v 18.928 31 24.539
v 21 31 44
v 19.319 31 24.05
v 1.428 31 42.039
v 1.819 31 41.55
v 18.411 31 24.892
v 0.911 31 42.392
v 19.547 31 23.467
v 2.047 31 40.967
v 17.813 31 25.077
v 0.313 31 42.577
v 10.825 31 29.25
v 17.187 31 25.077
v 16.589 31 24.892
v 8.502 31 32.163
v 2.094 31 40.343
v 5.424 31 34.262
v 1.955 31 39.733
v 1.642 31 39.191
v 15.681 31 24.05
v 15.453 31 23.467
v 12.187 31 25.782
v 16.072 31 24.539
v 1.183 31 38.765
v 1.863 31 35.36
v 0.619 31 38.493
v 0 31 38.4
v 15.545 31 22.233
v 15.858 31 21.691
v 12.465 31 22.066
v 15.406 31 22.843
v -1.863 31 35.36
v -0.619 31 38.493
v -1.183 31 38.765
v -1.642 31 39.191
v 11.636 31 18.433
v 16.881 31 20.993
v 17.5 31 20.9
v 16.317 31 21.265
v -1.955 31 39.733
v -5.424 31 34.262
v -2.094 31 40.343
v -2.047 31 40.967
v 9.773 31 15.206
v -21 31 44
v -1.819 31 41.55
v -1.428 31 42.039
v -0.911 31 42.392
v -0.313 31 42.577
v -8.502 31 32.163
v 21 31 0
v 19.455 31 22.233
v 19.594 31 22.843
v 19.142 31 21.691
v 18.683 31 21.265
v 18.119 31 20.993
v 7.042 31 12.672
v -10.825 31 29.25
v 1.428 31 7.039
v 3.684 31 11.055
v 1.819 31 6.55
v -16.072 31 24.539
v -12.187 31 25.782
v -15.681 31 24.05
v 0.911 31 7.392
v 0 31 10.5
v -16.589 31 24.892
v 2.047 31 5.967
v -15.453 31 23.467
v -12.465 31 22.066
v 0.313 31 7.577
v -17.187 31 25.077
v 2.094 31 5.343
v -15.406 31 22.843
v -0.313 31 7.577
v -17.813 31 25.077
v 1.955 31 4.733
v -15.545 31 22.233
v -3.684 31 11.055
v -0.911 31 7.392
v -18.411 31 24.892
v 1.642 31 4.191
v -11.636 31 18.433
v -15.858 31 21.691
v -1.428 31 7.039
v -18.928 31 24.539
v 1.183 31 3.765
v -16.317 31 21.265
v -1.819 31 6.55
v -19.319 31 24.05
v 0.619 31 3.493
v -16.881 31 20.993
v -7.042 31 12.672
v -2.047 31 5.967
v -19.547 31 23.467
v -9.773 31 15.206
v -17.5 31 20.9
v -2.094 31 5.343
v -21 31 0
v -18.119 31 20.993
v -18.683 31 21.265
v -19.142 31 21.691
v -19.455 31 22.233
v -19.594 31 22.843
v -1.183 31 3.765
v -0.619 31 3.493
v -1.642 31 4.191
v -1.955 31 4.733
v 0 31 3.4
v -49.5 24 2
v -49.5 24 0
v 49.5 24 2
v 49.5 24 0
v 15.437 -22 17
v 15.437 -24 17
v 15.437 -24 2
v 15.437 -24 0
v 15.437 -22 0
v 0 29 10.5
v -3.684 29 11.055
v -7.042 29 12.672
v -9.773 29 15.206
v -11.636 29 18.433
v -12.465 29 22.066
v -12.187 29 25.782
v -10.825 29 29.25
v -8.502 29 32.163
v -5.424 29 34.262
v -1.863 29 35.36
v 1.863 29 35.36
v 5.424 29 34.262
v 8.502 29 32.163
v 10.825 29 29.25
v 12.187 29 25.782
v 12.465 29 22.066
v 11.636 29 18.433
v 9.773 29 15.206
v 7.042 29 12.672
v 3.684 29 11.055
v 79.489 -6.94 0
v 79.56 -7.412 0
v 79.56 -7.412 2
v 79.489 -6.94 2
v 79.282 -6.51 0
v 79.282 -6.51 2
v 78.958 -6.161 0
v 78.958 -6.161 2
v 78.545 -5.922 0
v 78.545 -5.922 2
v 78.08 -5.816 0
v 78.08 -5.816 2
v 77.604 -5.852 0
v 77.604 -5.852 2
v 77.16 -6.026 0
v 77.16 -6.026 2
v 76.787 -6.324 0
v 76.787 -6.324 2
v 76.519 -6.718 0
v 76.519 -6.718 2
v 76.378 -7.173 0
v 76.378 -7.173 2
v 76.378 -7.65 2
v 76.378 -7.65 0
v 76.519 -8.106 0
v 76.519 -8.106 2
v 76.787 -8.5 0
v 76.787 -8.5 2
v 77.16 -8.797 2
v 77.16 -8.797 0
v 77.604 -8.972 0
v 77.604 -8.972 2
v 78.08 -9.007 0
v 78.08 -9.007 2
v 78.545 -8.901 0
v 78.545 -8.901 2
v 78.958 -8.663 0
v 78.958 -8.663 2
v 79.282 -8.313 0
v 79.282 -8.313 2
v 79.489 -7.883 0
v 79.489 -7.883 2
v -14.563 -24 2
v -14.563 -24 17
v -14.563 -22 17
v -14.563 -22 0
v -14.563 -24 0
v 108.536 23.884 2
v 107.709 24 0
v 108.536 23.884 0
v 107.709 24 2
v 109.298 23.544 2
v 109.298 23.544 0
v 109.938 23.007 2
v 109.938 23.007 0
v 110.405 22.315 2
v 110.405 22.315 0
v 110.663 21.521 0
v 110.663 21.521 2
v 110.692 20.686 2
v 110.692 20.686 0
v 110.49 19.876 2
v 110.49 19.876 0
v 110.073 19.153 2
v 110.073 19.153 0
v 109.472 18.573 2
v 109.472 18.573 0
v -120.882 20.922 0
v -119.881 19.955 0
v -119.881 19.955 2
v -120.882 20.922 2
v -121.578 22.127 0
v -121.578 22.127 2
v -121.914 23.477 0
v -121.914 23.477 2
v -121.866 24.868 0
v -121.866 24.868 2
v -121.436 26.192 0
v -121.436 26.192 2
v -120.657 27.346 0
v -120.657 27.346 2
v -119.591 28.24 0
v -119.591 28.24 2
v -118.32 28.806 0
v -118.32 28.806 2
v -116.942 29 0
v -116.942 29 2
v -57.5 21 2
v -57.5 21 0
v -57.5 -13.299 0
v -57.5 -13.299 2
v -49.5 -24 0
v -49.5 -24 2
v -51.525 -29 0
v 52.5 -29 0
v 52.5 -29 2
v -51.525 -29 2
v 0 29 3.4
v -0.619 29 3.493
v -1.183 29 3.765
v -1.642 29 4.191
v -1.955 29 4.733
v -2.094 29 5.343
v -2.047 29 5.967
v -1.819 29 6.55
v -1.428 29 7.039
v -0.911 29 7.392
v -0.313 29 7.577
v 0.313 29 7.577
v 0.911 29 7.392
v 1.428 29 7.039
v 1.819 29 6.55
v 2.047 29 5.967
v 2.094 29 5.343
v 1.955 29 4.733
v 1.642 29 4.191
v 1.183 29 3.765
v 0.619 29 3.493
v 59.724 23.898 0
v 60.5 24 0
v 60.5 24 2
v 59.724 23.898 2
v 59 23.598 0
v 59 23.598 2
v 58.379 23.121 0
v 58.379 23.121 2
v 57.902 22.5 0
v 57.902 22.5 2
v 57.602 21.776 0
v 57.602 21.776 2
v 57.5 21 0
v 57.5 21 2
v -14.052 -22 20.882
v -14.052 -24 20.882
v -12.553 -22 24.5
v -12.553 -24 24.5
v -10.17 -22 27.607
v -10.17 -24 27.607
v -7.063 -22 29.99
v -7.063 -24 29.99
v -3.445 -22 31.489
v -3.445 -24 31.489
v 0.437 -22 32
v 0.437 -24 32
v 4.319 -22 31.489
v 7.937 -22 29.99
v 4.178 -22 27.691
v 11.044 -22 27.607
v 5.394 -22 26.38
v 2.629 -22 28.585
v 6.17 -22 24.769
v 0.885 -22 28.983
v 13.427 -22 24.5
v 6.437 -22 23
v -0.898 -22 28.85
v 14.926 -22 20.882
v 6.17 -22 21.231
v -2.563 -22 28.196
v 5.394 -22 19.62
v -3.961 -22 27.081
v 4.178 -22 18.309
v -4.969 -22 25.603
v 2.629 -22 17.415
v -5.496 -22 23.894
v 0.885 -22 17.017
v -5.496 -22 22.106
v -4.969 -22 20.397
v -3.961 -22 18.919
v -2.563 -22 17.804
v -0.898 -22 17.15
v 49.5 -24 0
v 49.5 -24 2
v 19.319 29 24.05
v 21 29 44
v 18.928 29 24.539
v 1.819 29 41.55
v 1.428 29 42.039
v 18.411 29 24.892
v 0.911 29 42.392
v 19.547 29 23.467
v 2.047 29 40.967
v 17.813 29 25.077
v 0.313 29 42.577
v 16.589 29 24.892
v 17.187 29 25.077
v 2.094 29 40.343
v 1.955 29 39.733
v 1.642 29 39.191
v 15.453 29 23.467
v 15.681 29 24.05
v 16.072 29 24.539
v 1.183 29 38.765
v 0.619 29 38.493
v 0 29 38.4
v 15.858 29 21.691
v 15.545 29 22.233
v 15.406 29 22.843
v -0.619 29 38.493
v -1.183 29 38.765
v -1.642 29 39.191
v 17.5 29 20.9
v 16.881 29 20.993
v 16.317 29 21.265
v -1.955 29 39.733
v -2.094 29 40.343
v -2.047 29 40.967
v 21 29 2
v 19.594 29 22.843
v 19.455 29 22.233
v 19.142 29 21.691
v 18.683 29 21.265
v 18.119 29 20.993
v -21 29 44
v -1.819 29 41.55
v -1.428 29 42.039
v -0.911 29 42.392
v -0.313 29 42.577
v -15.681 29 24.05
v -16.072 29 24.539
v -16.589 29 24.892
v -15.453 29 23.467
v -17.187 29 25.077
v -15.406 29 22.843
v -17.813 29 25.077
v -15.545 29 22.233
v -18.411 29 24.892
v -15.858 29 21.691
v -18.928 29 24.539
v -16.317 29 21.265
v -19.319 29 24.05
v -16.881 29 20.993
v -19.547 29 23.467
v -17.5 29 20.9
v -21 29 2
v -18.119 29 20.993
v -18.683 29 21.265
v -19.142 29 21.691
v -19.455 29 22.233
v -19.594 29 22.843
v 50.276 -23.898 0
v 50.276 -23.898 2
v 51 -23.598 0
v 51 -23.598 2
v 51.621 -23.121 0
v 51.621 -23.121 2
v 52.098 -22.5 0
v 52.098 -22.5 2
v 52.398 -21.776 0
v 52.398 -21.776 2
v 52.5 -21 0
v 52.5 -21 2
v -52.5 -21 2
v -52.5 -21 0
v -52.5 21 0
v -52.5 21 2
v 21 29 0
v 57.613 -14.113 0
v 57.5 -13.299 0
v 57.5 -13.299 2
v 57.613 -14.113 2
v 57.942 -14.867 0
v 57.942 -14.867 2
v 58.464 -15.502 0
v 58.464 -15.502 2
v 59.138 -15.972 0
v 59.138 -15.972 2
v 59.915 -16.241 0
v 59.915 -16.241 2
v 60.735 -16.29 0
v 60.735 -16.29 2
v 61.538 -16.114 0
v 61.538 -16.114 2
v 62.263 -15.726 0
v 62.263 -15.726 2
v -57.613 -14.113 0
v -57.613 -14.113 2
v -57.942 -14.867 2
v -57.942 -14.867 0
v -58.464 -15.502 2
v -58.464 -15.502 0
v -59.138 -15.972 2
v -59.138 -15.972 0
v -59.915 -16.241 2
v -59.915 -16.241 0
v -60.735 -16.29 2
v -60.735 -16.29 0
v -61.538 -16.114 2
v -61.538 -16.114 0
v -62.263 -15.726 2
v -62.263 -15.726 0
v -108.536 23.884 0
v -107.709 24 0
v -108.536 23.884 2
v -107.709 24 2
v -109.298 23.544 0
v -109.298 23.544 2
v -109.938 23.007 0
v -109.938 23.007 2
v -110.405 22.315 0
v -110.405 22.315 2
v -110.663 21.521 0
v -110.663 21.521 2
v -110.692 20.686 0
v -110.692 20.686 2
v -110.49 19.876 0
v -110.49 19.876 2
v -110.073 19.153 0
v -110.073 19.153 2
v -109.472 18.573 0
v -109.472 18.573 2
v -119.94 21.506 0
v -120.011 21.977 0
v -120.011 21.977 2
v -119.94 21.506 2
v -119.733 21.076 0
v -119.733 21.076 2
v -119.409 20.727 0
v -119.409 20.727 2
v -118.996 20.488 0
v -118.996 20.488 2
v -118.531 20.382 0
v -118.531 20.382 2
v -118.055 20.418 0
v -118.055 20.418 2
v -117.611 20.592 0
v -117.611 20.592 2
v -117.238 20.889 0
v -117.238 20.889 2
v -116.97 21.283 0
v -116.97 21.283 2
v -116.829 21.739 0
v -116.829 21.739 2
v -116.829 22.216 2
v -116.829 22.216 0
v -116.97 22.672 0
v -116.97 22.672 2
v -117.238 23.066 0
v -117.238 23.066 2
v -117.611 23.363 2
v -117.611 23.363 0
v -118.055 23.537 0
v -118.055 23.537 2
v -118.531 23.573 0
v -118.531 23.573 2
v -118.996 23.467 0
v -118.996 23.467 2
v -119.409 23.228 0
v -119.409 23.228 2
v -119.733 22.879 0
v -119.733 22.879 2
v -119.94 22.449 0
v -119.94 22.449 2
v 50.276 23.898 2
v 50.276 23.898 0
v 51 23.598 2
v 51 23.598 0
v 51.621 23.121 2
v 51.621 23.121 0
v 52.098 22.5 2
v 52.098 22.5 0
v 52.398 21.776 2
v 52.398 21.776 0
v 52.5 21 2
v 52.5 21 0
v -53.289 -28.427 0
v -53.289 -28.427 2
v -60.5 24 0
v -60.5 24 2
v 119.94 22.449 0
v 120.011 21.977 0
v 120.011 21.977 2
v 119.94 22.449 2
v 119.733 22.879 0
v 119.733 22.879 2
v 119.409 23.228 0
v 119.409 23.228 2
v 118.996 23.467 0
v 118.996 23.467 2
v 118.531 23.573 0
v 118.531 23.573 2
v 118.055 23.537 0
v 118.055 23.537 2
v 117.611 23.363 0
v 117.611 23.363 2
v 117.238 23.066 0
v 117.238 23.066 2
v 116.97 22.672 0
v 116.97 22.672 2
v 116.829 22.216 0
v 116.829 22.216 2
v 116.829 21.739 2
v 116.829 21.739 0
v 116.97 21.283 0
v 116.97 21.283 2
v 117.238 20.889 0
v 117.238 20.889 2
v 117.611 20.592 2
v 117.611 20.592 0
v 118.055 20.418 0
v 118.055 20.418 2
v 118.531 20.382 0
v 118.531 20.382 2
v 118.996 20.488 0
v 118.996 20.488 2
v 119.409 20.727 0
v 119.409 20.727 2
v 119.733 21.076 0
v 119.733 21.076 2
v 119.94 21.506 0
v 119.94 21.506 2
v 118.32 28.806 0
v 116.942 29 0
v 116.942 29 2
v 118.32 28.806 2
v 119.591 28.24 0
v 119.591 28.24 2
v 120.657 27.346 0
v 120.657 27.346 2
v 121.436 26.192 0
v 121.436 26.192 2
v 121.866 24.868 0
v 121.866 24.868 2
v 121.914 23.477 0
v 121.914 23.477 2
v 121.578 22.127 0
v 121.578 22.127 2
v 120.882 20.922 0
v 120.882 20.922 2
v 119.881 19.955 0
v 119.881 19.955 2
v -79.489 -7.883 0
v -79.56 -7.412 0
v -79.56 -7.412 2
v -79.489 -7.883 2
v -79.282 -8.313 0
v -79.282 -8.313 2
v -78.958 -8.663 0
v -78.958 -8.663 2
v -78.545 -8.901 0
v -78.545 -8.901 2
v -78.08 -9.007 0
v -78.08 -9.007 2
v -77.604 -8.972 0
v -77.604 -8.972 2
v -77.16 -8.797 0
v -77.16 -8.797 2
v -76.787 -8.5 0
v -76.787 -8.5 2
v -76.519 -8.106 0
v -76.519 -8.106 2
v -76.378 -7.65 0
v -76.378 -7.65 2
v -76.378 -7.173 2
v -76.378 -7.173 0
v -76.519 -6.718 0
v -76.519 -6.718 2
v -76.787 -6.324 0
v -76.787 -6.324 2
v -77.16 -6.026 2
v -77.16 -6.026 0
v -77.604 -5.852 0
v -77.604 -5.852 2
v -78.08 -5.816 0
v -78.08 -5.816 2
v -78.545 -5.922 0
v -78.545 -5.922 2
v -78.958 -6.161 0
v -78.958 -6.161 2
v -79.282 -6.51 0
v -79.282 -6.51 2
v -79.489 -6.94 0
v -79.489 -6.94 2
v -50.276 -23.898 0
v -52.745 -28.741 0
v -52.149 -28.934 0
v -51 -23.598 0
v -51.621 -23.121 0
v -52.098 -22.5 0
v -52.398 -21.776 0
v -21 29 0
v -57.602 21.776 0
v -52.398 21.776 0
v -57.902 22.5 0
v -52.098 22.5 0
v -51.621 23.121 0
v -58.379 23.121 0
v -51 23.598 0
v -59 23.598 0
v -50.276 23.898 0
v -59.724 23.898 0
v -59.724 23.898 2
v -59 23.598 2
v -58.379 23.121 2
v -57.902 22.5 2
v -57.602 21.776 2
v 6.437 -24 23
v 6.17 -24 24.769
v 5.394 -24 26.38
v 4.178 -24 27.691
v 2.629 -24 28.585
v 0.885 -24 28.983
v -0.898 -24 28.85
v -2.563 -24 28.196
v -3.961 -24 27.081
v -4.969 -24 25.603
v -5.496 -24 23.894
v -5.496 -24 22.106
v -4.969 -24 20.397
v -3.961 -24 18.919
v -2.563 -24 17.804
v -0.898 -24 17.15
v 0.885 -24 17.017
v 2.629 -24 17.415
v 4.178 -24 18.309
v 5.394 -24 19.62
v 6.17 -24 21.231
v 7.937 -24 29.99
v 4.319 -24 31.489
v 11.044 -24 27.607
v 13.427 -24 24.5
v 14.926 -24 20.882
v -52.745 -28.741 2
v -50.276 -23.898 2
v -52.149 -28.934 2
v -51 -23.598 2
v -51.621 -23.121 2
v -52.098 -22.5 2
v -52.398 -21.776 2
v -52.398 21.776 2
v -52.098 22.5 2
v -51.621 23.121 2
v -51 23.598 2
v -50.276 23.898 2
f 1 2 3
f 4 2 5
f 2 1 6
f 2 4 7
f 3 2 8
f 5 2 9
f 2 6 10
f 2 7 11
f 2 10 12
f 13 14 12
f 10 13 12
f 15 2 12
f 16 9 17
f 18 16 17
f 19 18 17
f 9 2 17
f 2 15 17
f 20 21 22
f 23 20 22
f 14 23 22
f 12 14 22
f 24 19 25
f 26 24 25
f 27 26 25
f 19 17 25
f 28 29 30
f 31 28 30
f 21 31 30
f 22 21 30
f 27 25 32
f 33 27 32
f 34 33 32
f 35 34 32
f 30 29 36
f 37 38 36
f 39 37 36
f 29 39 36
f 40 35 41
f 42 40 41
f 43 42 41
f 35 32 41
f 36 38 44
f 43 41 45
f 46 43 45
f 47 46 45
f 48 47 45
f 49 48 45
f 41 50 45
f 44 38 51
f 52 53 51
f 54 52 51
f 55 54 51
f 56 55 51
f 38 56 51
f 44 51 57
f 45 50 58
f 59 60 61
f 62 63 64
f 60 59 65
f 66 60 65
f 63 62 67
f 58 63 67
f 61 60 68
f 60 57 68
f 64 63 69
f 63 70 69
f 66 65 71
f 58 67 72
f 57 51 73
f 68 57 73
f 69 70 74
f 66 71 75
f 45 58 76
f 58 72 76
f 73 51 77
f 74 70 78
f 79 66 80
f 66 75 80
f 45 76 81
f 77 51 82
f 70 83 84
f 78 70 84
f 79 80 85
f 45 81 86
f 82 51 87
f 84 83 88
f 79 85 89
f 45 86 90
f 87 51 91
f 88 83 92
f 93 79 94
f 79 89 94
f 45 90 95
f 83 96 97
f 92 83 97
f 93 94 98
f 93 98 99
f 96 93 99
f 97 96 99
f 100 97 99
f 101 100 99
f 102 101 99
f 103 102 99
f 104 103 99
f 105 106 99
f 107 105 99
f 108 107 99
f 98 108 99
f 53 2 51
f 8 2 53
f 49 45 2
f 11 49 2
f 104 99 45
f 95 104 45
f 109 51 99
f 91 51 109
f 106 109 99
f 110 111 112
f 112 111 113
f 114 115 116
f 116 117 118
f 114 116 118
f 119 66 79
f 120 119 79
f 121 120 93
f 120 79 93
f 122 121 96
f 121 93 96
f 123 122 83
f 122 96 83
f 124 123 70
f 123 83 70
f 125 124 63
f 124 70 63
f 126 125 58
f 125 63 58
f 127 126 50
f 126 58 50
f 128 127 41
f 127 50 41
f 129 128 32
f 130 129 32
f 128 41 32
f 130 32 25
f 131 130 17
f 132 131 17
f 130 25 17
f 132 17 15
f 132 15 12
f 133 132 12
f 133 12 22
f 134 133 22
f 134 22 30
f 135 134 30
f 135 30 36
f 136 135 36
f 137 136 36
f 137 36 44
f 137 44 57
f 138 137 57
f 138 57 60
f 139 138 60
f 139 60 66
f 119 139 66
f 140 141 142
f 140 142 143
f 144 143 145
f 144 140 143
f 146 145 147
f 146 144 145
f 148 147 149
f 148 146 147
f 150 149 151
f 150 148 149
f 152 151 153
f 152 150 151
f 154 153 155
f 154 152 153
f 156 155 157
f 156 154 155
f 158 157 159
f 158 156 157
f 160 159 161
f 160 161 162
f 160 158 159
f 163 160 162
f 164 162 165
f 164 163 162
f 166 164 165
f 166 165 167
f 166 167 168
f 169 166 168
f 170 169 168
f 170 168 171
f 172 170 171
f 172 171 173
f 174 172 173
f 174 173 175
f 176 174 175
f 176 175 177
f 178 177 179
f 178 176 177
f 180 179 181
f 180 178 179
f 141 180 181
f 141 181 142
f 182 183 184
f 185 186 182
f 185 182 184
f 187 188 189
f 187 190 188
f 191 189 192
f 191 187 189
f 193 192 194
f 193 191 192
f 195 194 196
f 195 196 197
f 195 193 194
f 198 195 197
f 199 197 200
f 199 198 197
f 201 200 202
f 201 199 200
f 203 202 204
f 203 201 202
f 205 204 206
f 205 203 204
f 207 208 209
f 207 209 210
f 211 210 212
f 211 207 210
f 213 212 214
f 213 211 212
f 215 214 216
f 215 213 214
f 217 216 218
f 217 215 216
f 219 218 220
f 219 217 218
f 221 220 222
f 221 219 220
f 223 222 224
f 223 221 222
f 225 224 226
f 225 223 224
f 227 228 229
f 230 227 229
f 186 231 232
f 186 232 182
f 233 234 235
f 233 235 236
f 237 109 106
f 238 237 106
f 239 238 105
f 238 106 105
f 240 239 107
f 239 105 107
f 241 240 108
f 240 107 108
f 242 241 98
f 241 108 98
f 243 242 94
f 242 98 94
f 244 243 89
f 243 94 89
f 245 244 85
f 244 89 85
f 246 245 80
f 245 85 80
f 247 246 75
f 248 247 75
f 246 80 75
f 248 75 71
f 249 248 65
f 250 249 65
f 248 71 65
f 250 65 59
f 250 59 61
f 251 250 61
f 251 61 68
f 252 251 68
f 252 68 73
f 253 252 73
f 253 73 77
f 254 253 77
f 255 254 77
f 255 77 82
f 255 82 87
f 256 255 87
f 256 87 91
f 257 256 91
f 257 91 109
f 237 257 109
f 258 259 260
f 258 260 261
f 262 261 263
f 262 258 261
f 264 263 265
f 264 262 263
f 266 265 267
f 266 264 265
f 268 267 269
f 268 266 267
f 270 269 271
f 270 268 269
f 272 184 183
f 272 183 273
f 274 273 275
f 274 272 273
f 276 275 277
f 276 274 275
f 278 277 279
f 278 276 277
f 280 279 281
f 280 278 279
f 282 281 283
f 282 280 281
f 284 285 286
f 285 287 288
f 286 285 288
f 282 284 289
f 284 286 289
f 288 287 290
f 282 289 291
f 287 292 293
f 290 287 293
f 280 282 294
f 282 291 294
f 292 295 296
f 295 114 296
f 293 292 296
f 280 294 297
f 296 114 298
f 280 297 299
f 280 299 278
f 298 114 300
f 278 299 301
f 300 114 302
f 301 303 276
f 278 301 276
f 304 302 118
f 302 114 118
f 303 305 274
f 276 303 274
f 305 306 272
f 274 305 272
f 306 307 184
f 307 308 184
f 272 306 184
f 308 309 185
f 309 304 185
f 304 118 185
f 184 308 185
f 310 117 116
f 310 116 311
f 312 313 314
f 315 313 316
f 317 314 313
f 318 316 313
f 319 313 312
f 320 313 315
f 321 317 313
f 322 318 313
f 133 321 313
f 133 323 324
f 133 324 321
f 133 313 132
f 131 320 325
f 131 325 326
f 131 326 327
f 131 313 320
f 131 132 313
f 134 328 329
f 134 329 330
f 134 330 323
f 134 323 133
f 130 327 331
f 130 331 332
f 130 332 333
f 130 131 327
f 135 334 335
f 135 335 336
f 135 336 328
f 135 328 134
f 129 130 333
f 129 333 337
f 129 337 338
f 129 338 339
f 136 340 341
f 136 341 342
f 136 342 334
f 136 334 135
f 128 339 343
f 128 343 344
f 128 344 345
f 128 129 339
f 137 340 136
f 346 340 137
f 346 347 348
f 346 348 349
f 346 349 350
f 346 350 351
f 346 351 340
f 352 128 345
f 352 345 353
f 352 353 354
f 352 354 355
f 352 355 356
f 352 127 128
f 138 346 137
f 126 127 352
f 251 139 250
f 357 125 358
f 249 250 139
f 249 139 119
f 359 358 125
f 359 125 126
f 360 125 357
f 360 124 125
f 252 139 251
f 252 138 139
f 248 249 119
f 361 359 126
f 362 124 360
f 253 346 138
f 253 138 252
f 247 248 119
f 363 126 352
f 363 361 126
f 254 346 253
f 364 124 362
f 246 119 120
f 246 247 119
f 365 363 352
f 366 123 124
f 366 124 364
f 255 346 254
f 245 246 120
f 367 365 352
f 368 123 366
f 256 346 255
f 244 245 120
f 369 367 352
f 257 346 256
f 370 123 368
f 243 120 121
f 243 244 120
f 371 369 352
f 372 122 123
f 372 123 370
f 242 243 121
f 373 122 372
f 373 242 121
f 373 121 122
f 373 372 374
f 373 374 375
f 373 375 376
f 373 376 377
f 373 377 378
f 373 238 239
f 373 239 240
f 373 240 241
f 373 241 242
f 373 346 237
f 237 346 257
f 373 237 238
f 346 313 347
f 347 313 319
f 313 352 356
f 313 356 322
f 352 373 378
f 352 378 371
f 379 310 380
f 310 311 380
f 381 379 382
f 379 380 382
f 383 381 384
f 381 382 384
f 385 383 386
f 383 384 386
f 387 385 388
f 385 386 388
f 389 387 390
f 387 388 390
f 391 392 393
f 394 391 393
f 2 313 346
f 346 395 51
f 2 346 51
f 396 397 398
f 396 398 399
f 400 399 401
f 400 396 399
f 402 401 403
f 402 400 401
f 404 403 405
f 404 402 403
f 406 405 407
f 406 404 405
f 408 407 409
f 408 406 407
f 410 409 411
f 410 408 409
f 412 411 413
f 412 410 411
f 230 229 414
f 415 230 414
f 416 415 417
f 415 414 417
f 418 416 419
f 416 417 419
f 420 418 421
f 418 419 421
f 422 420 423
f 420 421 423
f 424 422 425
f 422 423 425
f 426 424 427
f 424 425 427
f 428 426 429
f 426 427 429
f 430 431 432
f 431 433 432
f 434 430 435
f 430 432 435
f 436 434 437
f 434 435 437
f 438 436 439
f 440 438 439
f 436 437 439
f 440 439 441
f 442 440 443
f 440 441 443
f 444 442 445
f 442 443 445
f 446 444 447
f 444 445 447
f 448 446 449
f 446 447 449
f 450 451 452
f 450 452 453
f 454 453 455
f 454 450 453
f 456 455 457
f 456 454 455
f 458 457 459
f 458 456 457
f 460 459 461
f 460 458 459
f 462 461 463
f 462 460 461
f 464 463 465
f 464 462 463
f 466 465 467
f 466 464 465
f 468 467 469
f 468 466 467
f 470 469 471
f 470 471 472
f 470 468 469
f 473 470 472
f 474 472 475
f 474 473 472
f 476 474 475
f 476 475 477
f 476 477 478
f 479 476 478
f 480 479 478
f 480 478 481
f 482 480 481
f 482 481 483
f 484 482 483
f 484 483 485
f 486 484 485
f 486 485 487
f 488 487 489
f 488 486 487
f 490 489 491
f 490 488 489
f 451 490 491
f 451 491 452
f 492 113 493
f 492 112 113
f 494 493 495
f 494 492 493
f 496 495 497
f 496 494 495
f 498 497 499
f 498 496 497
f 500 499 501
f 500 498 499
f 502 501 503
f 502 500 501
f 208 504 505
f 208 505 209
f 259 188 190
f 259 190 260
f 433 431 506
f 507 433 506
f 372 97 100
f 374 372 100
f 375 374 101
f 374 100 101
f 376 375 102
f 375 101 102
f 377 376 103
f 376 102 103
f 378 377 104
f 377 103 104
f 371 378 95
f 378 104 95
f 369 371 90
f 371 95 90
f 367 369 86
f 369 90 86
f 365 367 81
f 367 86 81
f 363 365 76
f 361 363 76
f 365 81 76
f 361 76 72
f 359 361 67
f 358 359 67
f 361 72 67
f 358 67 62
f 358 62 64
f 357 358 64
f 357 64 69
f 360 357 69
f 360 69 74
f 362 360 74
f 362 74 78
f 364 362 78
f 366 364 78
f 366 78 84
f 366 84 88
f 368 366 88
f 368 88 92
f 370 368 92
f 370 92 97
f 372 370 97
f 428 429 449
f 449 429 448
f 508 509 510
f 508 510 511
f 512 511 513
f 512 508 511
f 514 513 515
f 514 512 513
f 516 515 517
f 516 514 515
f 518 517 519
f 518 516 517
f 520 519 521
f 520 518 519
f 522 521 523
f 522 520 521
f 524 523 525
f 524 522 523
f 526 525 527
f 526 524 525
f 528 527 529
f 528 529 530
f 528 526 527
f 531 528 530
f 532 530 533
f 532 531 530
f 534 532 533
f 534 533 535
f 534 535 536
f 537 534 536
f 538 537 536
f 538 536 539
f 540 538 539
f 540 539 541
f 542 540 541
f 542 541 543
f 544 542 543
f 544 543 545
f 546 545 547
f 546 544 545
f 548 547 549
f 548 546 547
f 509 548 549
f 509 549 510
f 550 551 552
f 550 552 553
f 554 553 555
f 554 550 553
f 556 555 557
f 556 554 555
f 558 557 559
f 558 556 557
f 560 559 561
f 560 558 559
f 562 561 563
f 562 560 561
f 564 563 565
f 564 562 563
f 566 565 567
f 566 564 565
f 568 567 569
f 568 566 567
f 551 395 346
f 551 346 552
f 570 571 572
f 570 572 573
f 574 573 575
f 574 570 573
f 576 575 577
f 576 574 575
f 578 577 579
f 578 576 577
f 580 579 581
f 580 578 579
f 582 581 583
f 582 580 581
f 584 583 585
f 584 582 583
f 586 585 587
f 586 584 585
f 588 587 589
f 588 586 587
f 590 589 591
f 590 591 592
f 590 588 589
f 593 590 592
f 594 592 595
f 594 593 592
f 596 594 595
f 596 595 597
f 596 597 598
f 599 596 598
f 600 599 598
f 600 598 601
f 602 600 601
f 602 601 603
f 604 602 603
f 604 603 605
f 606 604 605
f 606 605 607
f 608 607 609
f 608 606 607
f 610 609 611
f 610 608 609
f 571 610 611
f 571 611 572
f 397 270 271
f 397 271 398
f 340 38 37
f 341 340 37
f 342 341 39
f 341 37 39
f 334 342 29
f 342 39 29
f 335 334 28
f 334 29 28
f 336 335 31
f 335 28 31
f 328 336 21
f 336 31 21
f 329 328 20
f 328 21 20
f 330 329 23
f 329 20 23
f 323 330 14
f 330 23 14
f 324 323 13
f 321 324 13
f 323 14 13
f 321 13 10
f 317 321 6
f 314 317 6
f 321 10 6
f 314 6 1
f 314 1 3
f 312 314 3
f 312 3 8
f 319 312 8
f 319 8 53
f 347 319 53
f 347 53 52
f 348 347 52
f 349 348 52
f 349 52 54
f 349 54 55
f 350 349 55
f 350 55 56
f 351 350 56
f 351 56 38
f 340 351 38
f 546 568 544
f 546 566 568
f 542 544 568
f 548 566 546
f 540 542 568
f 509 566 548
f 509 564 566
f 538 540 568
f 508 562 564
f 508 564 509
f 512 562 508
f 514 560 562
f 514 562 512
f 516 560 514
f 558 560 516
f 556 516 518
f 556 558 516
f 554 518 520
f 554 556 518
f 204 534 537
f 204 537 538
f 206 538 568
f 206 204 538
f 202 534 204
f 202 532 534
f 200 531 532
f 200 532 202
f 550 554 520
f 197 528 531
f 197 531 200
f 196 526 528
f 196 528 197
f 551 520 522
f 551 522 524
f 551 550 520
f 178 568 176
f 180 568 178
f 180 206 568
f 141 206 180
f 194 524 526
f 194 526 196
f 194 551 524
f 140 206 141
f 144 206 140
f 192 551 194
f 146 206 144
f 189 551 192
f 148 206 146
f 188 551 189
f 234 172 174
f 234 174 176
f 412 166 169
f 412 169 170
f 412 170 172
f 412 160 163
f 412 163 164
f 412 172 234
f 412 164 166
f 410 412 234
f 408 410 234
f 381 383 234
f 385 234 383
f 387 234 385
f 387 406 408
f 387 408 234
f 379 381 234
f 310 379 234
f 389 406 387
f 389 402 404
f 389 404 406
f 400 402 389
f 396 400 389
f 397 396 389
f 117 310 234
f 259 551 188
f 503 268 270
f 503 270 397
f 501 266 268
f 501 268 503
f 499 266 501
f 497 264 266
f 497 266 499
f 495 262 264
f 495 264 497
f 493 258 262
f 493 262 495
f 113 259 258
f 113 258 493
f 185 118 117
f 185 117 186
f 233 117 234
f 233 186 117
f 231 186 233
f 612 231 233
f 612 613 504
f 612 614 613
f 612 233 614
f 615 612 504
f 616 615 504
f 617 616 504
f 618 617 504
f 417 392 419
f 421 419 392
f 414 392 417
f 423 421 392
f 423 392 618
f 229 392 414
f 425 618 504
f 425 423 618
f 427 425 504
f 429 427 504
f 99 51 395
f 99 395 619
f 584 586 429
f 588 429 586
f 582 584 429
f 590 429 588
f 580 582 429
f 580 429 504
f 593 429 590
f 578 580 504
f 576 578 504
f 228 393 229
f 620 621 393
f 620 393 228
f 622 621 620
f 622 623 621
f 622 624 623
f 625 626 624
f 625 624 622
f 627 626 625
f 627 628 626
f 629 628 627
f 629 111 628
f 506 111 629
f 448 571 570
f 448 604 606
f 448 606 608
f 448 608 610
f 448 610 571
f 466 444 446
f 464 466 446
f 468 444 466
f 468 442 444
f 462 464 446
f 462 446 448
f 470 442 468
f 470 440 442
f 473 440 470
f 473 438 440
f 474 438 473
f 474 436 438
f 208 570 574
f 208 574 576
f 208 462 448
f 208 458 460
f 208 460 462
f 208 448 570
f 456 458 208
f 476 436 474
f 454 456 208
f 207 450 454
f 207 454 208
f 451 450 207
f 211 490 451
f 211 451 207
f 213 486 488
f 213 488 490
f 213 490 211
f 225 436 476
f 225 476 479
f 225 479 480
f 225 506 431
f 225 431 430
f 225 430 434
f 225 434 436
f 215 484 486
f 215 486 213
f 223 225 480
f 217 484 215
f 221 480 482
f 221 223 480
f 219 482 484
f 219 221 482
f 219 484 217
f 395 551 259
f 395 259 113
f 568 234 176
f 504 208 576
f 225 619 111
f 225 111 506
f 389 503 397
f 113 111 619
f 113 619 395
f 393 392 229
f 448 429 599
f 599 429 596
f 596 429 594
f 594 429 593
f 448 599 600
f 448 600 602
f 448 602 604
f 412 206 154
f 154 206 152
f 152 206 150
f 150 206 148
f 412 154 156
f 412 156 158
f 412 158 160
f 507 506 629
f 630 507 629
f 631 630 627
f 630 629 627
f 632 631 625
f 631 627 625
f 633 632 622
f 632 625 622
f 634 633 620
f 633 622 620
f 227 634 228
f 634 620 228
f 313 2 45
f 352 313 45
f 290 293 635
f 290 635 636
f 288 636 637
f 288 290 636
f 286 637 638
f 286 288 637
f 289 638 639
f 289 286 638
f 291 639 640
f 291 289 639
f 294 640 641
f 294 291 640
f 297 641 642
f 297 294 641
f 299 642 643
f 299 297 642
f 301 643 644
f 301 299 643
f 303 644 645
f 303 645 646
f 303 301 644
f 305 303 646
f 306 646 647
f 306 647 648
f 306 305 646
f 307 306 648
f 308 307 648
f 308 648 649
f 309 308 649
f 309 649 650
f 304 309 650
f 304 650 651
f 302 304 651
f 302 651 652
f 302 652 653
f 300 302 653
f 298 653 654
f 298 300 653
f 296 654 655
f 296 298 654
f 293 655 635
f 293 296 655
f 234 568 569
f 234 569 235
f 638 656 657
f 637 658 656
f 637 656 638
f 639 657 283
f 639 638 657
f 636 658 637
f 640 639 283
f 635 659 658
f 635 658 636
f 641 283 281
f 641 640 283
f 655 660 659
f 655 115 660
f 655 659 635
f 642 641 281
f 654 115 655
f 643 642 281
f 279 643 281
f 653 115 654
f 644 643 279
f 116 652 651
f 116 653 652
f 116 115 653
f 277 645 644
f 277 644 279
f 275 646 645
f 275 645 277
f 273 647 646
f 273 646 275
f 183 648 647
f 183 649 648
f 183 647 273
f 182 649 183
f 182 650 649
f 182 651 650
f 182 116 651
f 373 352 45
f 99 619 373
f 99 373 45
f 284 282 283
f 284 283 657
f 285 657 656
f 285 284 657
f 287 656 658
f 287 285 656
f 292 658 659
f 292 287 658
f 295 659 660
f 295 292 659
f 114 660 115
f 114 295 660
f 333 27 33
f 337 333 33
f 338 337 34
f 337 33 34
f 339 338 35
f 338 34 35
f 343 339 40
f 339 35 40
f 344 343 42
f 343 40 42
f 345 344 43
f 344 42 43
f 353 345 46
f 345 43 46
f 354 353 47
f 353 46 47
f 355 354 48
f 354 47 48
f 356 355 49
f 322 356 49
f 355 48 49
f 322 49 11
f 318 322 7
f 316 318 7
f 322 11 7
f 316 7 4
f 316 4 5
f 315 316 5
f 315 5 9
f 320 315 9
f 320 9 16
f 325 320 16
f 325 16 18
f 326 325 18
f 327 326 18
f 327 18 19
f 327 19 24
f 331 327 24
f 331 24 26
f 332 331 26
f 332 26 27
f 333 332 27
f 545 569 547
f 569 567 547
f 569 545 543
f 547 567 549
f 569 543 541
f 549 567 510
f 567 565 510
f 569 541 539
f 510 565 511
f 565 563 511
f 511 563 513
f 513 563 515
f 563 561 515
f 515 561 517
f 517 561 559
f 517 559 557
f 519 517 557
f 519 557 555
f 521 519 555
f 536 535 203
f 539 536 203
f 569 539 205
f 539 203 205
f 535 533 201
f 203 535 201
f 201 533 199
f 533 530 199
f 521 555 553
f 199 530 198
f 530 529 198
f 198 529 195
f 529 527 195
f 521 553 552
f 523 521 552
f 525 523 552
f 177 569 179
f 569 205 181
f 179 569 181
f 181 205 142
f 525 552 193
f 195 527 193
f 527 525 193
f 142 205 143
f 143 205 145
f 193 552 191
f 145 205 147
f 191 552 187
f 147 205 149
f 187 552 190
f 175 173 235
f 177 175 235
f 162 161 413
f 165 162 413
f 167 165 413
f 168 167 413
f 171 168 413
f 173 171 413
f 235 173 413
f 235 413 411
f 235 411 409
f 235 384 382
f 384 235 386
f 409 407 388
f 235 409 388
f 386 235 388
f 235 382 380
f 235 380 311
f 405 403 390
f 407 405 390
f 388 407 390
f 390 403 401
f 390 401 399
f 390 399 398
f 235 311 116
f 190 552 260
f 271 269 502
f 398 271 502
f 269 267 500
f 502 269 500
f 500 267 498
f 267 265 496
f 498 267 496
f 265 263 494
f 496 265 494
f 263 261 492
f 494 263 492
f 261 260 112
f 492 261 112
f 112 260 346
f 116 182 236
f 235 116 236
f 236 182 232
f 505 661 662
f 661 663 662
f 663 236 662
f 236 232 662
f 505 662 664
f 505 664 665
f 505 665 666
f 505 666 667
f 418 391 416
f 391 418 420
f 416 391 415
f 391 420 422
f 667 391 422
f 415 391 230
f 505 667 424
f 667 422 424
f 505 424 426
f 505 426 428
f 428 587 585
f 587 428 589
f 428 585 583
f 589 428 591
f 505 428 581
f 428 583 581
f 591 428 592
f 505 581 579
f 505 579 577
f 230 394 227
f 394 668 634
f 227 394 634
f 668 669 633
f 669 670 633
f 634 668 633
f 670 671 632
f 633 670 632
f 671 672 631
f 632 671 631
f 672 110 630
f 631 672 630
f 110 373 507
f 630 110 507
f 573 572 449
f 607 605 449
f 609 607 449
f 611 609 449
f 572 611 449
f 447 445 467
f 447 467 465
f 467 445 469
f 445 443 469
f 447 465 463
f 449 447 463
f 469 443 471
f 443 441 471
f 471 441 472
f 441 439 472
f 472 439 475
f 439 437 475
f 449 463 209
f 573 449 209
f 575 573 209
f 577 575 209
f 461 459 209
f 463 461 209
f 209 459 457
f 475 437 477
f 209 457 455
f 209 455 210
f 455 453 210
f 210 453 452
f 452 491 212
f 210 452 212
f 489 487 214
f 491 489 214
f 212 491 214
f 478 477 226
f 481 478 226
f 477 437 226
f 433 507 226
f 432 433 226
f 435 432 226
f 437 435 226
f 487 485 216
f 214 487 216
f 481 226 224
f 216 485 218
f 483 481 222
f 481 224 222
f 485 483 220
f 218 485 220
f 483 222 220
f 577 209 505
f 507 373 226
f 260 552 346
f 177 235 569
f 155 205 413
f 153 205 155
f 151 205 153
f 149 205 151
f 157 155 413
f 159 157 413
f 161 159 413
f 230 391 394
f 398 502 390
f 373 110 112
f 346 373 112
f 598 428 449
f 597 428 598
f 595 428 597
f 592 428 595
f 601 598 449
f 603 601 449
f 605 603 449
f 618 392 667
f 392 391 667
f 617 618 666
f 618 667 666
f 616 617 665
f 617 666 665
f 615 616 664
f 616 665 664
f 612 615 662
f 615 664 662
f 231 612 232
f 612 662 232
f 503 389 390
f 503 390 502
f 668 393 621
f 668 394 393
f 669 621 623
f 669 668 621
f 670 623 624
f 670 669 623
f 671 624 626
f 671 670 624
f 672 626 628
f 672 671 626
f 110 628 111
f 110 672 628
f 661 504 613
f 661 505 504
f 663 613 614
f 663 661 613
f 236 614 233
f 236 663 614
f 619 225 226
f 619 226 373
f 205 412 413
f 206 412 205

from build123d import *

# Parameters (mm, degrees)
SKETCH_1_R                      = 1.6
SKETCH_1_W                      = 105
SKETCH_1_H                      = 48
EXTRUDE_1_DEPTH                 = 2
FILLET_1_R                      = 3
SKETCH_2_W                      = 30
SKETCH_2_H                      = 2
EXTRUDE_2_DEPTH                 = 32
CUT_EXTRUDE_START               = -2
CUT_EXTRUDE_1_OUTLINE_R         = 6
CUT_EXTRUDE_1_DEPTH             = 2
SKETCH_4_W                      = 42
SKETCH_4_H                      = 2
EXTRUDE_3_DEPTH                 = 44
CUT_EXTRUDE_2_REACH             = 144.849
SKETCH_5_R                      = 2.1
SKETCH_5_R_2                    = 12.5
CUT_EXTRUDE_2_DIRECTION_2_DEPTH = 143.84882365


# Read off the part's stored shape, not the designer's step: ｶｯﾄ - 押し出し1
with BuildPart() as part:
    # ｽｹｯﾁ1 → ﾎﾞｽ - 押し出し1 (new body)
    with BuildSketch(Plane.XY):
        with BuildLine():
            Line((-116.941733701, 29), (116.941733701, 29))
            ThreePointArc((116.941733701, 29), (121.697016283, 25.545084972), (119.880659963, 19.954915028))
            Line((119.880659963, 19.954915028), (52.5, -29))
            Line((52.5, -29), (-52.5, -29))
            Line((-52.5, -29), (-119.880659963, 19.954915028))
            ThreePointArc((-119.880659963, 19.954915028), (-121.697016283, 25.545084972), (-116.941733701, 29))
        make_face()
        with Locations((118.411196832, 21.977457514)):
            Circle(SKETCH_1_R, mode=Mode.SUBTRACT)
        with Locations((77.960347113, -7.411805101)):
            Circle(SKETCH_1_R, mode=Mode.SUBTRACT)
        with Locations(Location((-118.411196832, 21.977457514, 0), (0, 0, 180))):
            Circle(SKETCH_1_R, mode=Mode.SUBTRACT)
        with Locations(Location((-77.960347113, -7.411805101, 0), (0, 0, 180))):
            Circle(SKETCH_1_R, mode=Mode.SUBTRACT)
        Rectangle(SKETCH_1_W, SKETCH_1_H, mode=Mode.SUBTRACT)
        with BuildLine():
            Line((-57.5, 21), (-57.5, -13.299115956))
            ThreePointArc((-57.5, -13.299115956), (-59.138028501, -15.972135529), (-62.263355757, -15.726166939))
            Line((-62.263355757, -15.726166939), (-116.941733701, 24))
            Line((-116.941733701, 24), (-60.5, 24))
            ThreePointArc((-60.5, 24), (-58.378679656, 23.121320344), (-57.5, 21))
        make_face(mode=Mode.SUBTRACT)
        with BuildLine():
            Line((62.263355757, -15.726166939), (116.941733701, 24))
            Line((116.941733701, 24), (60.5, 24))
            ThreePointArc((60.5, 24), (58.378679656, 23.121320344), (57.5, 21))
            Line((57.5, 21), (57.5, -13.299115956))
            ThreePointArc((57.5, -13.299115956), (59.138028501, -15.972135529), (62.263355757, -15.726166939))
        make_face(mode=Mode.SUBTRACT)
    extrude(amount=EXTRUDE_1_DEPTH)

    # ﾌｨﾚｯﾄ1
    fillet_1_edges = [part.edges().sort_by_distance(p)[0] for p in [
        (-52.5, -29, 1),
        (-52.5, 24, 1),
        (-52.5, -24, 1),
        (52.5, -24, 1),
        (52.5, 24, 1),
        (116.941733701, 24, 1),
        (-116.941733701, 24, 1),
    ]]
    fillet(fillet_1_edges, radius=FILLET_1_R)

    # ｽｹｯﾁ2 → ﾎﾞｽ - 押し出し2 (add)
    with BuildSketch(Plane(origin=(0, 0, 0), x_dir=(-1, 0, 0), z_dir=(0, 0, -1))):
        with Locations((-0.436960971, -23)):
            Rectangle(SKETCH_2_W, SKETCH_2_H)
    extrude(amount=-EXTRUDE_2_DEPTH)

    # ｶｯﾄ - 押し出し1 outline → ｶｯﾄ - 押し出し1 (cut)
    with BuildSketch(Plane.XZ.offset(24).offset(CUT_EXTRUDE_START)):
        with BuildLine():
            ThreePointArc((-14.563039029, 17), (-10.169640747, 27.606601718), (0.436960971, 32))
            Line((0.436960971, 32), (-14.563039029, 32))
            Line((-14.563039029, 32), (-14.563039029, 17))
        make_face()
        with BuildLine():
            ThreePointArc((0.436960971, 32), (11.043562689, 27.606601718), (15.436960971, 17))
            Line((15.436960971, 17), (15.436960971, 32))
            Line((15.436960971, 32), (0.436960971, 32))
        make_face()
        with Locations((0.436960971, 23)):
            Circle(CUT_EXTRUDE_1_OUTLINE_R)
    extrude(amount=CUT_EXTRUDE_1_DEPTH, mode=Mode.SUBTRACT)

    # ｽｹｯﾁ4 → ﾎﾞｽ - 押し出し3 (add)
    with BuildSketch(Plane(origin=(0, 0, 0), x_dir=(-1, 0, 0), z_dir=(0, 0, -1))):
        with Locations((0, 30)):
            Rectangle(SKETCH_4_W, SKETCH_4_H)
    extrude(amount=-EXTRUDE_3_DEPTH)

    # ｽｹｯﾁ5 → ｶｯﾄ - 押し出し2 (cut, up to next)
    with BuildSketch(Plane(origin=(0, 31, 0), x_dir=(1, 0, 0), z_dir=(0, 1, 0)), mode=Mode.PRIVATE) as cut_extrude_2_sk1:
        with Locations(Location((0, -5.5, 0), (0, 0, 90))):
            Circle(SKETCH_5_R)
    cut_extrude_2_tool1 = extrude(cut_extrude_2_sk1.sketch, amount=-CUT_EXTRUDE_2_REACH, mode=Mode.PRIVATE) & part.part
    # ｽｹｯﾁ5 → ｶｯﾄ - 押し出し2 (cut, up to next)
    with BuildSketch(Plane(origin=(0, 31, 0), x_dir=(1, 0, 0), z_dir=(0, 1, 0)), mode=Mode.PRIVATE) as cut_extrude_2_sk2:
        with Locations(Location((-17.5, -23, 0), (0, 0, 90))):
            Circle(SKETCH_5_R)
    cut_extrude_2_tool2 = extrude(cut_extrude_2_sk2.sketch, amount=-CUT_EXTRUDE_2_REACH, mode=Mode.PRIVATE) & part.part
    # ｽｹｯﾁ5 → ｶｯﾄ - 押し出し2 (cut, up to next)
    with BuildSketch(Plane(origin=(0, 31, 0), x_dir=(1, 0, 0), z_dir=(0, 1, 0)), mode=Mode.PRIVATE) as cut_extrude_2_sk3:
        with Locations(Location((0, -40.5, 0), (0, 0, 90))):
            Circle(SKETCH_5_R)
    cut_extrude_2_tool3 = extrude(cut_extrude_2_sk3.sketch, amount=-CUT_EXTRUDE_2_REACH, mode=Mode.PRIVATE) & part.part
    # ｽｹｯﾁ5 → ｶｯﾄ - 押し出し2 (cut, up to next)
    with BuildSketch(Plane(origin=(0, 31, 0), x_dir=(1, 0, 0), z_dir=(0, 1, 0)), mode=Mode.PRIVATE) as cut_extrude_2_sk4:
        with Locations(Location((17.5, -23, 0), (0, 0, 90))):
            Circle(SKETCH_5_R)
    cut_extrude_2_tool4 = extrude(cut_extrude_2_sk4.sketch, amount=-CUT_EXTRUDE_2_REACH, mode=Mode.PRIVATE) & part.part
    # ｽｹｯﾁ5 → ｶｯﾄ - 押し出し2 (cut, up to next)
    with BuildSketch(Plane(origin=(0, 31, 0), x_dir=(1, 0, 0), z_dir=(0, 1, 0)), mode=Mode.PRIVATE) as cut_extrude_2_sk5:
        with Locations(Location((0, -23, 0), (0, 0, 90))):
            Circle(SKETCH_5_R_2)
    cut_extrude_2_tool5 = extrude(cut_extrude_2_sk5.sketch, amount=-CUT_EXTRUDE_2_REACH, mode=Mode.PRIVATE) & part.part
    add(cut_extrude_2_tool1.solids().sort_by_distance((0, 31, 5.5))[0], mode=Mode.SUBTRACT)
    add(cut_extrude_2_tool2.solids().sort_by_distance((-17.5, 31, 23))[0], mode=Mode.SUBTRACT)
    add(cut_extrude_2_tool3.solids().sort_by_distance((0, 31, 40.5))[0], mode=Mode.SUBTRACT)
    add(cut_extrude_2_tool4.solids().sort_by_distance((17.5, 31, 23))[0], mode=Mode.SUBTRACT)
    add(cut_extrude_2_tool5.solids().sort_by_distance((0, 31, 23))[0], mode=Mode.SUBTRACT)

    # ｽｹｯﾁ5 → ｶｯﾄ - 押し出し2 direction 2 (cut)
    with BuildSketch(Plane(origin=(0, 31, 0), x_dir=(1, 0, 0), z_dir=(0, 1, 0))):
        with Locations(Location((0, -5.5, 0), (0, 0, 90))):
            Circle(SKETCH_5_R)
        with Locations(Location((-17.5, -23, 0), (0, 0, 90))):
            Circle(SKETCH_5_R)
        with Locations(Location((0, -40.5, 0), (0, 0, 90))):
            Circle(SKETCH_5_R)
        with Locations(Location((17.5, -23, 0), (0, 0, 90))):
            Circle(SKETCH_5_R)
        with Locations(Location((0, -23, 0), (0, 0, 90))):
            Circle(SKETCH_5_R_2)
    extrude(amount=CUT_EXTRUDE_2_DIRECTION_2_DEPTH, mode=Mode.SUBTRACT)


solid = part.part
